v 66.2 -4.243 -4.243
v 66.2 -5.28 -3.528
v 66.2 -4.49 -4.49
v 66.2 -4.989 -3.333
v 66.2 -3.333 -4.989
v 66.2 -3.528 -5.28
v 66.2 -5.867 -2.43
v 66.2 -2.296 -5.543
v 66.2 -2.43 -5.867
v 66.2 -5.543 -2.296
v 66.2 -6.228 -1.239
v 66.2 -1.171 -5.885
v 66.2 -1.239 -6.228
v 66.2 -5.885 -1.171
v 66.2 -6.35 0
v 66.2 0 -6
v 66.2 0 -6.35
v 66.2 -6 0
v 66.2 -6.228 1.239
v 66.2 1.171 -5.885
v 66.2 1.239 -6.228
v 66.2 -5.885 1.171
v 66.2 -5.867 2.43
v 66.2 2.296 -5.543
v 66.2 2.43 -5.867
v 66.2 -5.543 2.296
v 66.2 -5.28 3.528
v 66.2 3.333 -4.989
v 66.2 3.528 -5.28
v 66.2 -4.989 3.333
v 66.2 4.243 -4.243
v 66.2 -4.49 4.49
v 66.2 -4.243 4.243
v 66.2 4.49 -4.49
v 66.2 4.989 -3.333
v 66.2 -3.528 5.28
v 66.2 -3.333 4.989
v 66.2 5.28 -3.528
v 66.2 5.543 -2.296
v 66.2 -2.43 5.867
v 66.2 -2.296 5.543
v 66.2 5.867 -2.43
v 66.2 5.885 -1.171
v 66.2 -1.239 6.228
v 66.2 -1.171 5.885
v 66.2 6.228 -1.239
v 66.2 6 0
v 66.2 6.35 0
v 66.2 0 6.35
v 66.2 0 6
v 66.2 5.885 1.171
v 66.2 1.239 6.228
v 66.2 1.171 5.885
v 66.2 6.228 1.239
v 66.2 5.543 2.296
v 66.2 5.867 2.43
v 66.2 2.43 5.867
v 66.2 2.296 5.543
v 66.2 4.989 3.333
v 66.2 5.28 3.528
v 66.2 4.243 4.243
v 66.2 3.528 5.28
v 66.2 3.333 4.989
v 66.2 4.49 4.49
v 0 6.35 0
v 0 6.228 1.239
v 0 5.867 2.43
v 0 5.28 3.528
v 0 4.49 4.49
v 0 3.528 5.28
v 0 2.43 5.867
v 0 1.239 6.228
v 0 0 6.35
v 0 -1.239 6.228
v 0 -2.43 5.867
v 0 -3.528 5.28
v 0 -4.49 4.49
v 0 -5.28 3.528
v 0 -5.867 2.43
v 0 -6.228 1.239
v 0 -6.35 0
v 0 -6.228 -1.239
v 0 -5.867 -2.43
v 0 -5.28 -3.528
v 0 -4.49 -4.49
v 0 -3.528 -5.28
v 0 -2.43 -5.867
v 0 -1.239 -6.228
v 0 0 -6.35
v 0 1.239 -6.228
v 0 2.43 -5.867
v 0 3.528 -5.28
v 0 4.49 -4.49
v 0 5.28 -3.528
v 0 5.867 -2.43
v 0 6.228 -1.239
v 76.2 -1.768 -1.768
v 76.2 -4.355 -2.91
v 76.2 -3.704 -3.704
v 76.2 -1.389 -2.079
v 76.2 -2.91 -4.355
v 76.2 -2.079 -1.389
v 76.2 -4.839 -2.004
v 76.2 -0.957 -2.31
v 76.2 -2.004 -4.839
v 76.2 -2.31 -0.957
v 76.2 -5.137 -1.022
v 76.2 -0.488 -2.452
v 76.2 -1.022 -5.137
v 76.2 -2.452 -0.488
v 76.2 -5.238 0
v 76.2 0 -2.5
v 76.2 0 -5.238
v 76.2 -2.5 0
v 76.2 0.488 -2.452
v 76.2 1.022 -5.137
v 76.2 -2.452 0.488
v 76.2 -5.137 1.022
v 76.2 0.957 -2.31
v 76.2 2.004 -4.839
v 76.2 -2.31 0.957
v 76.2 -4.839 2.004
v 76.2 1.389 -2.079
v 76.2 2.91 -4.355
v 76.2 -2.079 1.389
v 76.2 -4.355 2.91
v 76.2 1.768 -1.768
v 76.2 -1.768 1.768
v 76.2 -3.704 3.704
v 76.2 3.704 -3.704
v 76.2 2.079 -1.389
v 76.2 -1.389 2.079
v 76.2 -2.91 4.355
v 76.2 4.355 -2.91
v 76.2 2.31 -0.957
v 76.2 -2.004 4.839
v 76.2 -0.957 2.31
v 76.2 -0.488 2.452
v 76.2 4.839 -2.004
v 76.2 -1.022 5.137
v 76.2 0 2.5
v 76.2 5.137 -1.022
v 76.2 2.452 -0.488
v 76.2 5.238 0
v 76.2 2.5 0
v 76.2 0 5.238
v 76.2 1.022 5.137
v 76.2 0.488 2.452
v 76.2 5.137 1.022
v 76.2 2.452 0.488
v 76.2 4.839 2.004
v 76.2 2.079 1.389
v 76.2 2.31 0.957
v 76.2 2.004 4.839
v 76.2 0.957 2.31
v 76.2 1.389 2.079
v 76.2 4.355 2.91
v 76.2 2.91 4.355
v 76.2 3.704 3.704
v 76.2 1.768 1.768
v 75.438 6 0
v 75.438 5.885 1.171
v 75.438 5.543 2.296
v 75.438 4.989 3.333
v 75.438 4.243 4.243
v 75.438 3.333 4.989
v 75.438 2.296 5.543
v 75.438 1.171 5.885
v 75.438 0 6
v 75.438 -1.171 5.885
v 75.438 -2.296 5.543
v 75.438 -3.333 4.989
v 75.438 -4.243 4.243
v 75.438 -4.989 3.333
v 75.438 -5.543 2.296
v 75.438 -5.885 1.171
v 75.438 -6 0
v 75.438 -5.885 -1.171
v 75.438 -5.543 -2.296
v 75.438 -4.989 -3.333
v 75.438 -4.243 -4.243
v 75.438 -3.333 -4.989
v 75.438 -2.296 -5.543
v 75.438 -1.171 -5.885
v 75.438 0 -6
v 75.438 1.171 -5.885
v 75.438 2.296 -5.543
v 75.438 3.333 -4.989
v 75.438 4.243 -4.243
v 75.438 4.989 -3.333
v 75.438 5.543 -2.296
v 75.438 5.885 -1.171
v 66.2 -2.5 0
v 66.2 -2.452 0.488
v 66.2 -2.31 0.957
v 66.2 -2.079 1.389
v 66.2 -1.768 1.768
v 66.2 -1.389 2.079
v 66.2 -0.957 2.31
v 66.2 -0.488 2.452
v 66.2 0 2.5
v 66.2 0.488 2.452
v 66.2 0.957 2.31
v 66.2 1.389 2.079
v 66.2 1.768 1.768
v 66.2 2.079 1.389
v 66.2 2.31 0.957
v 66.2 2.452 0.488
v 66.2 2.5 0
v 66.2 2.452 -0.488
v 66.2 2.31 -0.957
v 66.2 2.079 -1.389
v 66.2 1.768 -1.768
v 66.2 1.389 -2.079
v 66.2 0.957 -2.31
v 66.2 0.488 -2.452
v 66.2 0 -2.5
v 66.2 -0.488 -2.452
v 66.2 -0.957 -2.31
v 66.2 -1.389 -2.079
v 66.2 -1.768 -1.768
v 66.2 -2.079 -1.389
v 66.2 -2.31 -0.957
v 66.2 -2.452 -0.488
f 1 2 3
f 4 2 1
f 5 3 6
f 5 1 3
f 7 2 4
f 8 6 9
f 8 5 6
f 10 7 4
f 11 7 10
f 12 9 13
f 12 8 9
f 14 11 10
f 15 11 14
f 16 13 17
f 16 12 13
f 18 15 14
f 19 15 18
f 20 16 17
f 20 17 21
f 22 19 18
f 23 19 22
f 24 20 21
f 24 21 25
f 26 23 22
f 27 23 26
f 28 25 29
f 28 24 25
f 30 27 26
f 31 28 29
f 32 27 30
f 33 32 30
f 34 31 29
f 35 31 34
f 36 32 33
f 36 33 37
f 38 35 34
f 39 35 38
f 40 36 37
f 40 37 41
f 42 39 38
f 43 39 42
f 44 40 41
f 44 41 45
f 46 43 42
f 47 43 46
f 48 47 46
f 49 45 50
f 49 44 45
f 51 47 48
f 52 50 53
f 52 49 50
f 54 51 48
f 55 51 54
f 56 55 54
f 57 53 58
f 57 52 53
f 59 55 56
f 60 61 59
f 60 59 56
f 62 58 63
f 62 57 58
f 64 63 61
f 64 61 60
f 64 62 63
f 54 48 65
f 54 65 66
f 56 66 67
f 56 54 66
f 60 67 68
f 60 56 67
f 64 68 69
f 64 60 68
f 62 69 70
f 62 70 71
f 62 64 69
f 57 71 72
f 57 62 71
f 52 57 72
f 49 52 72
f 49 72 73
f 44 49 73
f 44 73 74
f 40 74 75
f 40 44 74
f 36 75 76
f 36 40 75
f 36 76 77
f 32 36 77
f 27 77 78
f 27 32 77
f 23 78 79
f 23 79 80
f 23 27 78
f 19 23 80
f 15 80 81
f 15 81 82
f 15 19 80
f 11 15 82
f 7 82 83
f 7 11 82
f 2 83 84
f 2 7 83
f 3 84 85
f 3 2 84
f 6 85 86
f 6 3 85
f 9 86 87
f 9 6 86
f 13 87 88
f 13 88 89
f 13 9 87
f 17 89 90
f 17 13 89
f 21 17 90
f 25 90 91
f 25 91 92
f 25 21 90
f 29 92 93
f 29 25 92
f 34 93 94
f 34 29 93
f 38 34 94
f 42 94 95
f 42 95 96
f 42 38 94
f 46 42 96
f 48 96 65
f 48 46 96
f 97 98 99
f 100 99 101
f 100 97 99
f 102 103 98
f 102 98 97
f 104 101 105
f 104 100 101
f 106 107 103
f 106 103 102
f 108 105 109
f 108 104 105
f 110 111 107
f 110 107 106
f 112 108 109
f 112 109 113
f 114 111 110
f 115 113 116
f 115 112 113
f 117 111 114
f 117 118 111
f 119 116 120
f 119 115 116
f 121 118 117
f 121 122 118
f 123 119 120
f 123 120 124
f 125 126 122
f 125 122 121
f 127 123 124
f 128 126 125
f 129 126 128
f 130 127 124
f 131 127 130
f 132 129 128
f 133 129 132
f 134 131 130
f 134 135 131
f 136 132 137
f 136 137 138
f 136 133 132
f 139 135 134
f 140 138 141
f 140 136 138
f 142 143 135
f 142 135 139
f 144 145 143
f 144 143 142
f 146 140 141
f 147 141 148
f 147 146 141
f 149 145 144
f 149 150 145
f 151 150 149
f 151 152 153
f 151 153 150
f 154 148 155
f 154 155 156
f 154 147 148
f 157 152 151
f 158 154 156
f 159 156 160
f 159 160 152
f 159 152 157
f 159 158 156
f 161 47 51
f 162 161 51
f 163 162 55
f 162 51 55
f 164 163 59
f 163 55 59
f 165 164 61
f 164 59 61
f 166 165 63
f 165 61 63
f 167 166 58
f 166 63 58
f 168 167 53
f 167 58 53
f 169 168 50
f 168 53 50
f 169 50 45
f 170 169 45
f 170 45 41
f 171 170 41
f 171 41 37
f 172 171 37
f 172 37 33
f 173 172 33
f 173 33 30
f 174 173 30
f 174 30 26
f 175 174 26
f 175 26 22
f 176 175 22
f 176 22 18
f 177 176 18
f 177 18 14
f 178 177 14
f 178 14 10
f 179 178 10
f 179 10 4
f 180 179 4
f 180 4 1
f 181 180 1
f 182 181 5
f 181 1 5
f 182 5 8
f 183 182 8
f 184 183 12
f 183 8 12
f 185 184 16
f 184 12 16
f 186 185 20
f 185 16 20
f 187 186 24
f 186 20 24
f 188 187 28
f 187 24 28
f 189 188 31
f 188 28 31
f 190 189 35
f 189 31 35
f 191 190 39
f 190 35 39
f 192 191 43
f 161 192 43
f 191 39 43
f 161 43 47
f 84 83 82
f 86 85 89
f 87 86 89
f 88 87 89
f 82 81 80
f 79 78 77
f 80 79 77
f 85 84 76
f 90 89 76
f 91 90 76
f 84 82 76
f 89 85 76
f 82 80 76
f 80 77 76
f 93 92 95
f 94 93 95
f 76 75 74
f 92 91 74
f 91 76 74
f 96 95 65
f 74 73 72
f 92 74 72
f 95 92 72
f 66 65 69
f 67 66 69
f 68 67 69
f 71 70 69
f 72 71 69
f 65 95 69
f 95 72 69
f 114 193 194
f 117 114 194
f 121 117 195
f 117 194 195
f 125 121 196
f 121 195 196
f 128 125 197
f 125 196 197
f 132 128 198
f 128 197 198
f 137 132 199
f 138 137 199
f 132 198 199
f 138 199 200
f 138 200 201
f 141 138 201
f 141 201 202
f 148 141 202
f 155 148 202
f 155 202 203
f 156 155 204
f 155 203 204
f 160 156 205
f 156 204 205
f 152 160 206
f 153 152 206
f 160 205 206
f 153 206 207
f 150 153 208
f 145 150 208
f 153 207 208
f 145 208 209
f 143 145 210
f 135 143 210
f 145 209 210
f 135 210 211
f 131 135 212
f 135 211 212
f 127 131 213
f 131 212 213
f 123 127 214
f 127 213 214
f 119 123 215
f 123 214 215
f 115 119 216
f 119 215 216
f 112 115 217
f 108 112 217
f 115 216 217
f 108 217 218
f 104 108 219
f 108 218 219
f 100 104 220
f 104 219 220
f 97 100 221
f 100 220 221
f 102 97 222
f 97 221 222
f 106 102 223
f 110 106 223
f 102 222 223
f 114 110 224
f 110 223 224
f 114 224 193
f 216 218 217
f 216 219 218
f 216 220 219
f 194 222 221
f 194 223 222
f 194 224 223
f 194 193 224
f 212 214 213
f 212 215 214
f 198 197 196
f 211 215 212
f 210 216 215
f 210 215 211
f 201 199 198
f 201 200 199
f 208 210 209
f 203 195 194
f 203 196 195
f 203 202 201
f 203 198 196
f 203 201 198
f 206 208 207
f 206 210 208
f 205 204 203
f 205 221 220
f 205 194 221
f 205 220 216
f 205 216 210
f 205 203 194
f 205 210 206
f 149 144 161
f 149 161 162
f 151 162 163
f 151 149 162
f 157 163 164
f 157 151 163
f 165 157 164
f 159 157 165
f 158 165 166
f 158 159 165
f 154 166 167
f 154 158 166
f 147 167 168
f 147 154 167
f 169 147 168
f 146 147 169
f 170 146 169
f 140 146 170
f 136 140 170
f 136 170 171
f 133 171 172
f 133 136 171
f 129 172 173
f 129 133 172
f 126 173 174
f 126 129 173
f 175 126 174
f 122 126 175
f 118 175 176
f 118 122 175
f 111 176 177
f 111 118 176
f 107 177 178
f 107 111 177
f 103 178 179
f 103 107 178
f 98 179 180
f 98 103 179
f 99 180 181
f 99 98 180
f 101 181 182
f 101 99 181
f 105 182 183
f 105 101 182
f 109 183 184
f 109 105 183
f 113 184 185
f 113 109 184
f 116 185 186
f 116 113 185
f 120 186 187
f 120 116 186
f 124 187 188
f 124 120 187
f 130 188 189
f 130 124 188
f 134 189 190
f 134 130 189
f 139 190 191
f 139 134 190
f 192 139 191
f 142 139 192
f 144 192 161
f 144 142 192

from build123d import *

# Parameters (mm, degrees)
F0_R     = 6
F1_DEPTH = 76.2
F2_SIZE  = 0.762
F4_D     = 5
F4_DEPTH = 16
F4_TIP   = 1.5021515476
F6_R     = 6.35
F7_DEPTH = 66.2


with BuildPart() as f1:
    # F0 (on Right) → F1 (new body)
    with BuildSketch(Plane.YZ):
        Circle(F0_R)
    extrude(amount=F1_DEPTH)

    # F2
    f2_edges = [f1.edges().sort_by_distance(p)[0] for p in [
        (76.2, -6, 0),
    ]]
    chamfer(f2_edges, length=F2_SIZE)

    # F4
    with Locations(Plane.YZ.offset(76.2)):
        with Locations((0, 0)):
            Hole(F4_D / 2, depth=F4_DEPTH)
            with Locations((0, 0, -(F4_DEPTH + F4_TIP / 2))):  # 118° drill point
                Cone(0, F4_D / 2, F4_TIP, mode=Mode.SUBTRACT)

    # F6 (on offset) → F7 (join, through all)
    with BuildSketch(Plane.YZ.offset(66.2)):
        Circle(F6_R)
    extrude(amount=-F7_DEPTH)


solid = f1.part
